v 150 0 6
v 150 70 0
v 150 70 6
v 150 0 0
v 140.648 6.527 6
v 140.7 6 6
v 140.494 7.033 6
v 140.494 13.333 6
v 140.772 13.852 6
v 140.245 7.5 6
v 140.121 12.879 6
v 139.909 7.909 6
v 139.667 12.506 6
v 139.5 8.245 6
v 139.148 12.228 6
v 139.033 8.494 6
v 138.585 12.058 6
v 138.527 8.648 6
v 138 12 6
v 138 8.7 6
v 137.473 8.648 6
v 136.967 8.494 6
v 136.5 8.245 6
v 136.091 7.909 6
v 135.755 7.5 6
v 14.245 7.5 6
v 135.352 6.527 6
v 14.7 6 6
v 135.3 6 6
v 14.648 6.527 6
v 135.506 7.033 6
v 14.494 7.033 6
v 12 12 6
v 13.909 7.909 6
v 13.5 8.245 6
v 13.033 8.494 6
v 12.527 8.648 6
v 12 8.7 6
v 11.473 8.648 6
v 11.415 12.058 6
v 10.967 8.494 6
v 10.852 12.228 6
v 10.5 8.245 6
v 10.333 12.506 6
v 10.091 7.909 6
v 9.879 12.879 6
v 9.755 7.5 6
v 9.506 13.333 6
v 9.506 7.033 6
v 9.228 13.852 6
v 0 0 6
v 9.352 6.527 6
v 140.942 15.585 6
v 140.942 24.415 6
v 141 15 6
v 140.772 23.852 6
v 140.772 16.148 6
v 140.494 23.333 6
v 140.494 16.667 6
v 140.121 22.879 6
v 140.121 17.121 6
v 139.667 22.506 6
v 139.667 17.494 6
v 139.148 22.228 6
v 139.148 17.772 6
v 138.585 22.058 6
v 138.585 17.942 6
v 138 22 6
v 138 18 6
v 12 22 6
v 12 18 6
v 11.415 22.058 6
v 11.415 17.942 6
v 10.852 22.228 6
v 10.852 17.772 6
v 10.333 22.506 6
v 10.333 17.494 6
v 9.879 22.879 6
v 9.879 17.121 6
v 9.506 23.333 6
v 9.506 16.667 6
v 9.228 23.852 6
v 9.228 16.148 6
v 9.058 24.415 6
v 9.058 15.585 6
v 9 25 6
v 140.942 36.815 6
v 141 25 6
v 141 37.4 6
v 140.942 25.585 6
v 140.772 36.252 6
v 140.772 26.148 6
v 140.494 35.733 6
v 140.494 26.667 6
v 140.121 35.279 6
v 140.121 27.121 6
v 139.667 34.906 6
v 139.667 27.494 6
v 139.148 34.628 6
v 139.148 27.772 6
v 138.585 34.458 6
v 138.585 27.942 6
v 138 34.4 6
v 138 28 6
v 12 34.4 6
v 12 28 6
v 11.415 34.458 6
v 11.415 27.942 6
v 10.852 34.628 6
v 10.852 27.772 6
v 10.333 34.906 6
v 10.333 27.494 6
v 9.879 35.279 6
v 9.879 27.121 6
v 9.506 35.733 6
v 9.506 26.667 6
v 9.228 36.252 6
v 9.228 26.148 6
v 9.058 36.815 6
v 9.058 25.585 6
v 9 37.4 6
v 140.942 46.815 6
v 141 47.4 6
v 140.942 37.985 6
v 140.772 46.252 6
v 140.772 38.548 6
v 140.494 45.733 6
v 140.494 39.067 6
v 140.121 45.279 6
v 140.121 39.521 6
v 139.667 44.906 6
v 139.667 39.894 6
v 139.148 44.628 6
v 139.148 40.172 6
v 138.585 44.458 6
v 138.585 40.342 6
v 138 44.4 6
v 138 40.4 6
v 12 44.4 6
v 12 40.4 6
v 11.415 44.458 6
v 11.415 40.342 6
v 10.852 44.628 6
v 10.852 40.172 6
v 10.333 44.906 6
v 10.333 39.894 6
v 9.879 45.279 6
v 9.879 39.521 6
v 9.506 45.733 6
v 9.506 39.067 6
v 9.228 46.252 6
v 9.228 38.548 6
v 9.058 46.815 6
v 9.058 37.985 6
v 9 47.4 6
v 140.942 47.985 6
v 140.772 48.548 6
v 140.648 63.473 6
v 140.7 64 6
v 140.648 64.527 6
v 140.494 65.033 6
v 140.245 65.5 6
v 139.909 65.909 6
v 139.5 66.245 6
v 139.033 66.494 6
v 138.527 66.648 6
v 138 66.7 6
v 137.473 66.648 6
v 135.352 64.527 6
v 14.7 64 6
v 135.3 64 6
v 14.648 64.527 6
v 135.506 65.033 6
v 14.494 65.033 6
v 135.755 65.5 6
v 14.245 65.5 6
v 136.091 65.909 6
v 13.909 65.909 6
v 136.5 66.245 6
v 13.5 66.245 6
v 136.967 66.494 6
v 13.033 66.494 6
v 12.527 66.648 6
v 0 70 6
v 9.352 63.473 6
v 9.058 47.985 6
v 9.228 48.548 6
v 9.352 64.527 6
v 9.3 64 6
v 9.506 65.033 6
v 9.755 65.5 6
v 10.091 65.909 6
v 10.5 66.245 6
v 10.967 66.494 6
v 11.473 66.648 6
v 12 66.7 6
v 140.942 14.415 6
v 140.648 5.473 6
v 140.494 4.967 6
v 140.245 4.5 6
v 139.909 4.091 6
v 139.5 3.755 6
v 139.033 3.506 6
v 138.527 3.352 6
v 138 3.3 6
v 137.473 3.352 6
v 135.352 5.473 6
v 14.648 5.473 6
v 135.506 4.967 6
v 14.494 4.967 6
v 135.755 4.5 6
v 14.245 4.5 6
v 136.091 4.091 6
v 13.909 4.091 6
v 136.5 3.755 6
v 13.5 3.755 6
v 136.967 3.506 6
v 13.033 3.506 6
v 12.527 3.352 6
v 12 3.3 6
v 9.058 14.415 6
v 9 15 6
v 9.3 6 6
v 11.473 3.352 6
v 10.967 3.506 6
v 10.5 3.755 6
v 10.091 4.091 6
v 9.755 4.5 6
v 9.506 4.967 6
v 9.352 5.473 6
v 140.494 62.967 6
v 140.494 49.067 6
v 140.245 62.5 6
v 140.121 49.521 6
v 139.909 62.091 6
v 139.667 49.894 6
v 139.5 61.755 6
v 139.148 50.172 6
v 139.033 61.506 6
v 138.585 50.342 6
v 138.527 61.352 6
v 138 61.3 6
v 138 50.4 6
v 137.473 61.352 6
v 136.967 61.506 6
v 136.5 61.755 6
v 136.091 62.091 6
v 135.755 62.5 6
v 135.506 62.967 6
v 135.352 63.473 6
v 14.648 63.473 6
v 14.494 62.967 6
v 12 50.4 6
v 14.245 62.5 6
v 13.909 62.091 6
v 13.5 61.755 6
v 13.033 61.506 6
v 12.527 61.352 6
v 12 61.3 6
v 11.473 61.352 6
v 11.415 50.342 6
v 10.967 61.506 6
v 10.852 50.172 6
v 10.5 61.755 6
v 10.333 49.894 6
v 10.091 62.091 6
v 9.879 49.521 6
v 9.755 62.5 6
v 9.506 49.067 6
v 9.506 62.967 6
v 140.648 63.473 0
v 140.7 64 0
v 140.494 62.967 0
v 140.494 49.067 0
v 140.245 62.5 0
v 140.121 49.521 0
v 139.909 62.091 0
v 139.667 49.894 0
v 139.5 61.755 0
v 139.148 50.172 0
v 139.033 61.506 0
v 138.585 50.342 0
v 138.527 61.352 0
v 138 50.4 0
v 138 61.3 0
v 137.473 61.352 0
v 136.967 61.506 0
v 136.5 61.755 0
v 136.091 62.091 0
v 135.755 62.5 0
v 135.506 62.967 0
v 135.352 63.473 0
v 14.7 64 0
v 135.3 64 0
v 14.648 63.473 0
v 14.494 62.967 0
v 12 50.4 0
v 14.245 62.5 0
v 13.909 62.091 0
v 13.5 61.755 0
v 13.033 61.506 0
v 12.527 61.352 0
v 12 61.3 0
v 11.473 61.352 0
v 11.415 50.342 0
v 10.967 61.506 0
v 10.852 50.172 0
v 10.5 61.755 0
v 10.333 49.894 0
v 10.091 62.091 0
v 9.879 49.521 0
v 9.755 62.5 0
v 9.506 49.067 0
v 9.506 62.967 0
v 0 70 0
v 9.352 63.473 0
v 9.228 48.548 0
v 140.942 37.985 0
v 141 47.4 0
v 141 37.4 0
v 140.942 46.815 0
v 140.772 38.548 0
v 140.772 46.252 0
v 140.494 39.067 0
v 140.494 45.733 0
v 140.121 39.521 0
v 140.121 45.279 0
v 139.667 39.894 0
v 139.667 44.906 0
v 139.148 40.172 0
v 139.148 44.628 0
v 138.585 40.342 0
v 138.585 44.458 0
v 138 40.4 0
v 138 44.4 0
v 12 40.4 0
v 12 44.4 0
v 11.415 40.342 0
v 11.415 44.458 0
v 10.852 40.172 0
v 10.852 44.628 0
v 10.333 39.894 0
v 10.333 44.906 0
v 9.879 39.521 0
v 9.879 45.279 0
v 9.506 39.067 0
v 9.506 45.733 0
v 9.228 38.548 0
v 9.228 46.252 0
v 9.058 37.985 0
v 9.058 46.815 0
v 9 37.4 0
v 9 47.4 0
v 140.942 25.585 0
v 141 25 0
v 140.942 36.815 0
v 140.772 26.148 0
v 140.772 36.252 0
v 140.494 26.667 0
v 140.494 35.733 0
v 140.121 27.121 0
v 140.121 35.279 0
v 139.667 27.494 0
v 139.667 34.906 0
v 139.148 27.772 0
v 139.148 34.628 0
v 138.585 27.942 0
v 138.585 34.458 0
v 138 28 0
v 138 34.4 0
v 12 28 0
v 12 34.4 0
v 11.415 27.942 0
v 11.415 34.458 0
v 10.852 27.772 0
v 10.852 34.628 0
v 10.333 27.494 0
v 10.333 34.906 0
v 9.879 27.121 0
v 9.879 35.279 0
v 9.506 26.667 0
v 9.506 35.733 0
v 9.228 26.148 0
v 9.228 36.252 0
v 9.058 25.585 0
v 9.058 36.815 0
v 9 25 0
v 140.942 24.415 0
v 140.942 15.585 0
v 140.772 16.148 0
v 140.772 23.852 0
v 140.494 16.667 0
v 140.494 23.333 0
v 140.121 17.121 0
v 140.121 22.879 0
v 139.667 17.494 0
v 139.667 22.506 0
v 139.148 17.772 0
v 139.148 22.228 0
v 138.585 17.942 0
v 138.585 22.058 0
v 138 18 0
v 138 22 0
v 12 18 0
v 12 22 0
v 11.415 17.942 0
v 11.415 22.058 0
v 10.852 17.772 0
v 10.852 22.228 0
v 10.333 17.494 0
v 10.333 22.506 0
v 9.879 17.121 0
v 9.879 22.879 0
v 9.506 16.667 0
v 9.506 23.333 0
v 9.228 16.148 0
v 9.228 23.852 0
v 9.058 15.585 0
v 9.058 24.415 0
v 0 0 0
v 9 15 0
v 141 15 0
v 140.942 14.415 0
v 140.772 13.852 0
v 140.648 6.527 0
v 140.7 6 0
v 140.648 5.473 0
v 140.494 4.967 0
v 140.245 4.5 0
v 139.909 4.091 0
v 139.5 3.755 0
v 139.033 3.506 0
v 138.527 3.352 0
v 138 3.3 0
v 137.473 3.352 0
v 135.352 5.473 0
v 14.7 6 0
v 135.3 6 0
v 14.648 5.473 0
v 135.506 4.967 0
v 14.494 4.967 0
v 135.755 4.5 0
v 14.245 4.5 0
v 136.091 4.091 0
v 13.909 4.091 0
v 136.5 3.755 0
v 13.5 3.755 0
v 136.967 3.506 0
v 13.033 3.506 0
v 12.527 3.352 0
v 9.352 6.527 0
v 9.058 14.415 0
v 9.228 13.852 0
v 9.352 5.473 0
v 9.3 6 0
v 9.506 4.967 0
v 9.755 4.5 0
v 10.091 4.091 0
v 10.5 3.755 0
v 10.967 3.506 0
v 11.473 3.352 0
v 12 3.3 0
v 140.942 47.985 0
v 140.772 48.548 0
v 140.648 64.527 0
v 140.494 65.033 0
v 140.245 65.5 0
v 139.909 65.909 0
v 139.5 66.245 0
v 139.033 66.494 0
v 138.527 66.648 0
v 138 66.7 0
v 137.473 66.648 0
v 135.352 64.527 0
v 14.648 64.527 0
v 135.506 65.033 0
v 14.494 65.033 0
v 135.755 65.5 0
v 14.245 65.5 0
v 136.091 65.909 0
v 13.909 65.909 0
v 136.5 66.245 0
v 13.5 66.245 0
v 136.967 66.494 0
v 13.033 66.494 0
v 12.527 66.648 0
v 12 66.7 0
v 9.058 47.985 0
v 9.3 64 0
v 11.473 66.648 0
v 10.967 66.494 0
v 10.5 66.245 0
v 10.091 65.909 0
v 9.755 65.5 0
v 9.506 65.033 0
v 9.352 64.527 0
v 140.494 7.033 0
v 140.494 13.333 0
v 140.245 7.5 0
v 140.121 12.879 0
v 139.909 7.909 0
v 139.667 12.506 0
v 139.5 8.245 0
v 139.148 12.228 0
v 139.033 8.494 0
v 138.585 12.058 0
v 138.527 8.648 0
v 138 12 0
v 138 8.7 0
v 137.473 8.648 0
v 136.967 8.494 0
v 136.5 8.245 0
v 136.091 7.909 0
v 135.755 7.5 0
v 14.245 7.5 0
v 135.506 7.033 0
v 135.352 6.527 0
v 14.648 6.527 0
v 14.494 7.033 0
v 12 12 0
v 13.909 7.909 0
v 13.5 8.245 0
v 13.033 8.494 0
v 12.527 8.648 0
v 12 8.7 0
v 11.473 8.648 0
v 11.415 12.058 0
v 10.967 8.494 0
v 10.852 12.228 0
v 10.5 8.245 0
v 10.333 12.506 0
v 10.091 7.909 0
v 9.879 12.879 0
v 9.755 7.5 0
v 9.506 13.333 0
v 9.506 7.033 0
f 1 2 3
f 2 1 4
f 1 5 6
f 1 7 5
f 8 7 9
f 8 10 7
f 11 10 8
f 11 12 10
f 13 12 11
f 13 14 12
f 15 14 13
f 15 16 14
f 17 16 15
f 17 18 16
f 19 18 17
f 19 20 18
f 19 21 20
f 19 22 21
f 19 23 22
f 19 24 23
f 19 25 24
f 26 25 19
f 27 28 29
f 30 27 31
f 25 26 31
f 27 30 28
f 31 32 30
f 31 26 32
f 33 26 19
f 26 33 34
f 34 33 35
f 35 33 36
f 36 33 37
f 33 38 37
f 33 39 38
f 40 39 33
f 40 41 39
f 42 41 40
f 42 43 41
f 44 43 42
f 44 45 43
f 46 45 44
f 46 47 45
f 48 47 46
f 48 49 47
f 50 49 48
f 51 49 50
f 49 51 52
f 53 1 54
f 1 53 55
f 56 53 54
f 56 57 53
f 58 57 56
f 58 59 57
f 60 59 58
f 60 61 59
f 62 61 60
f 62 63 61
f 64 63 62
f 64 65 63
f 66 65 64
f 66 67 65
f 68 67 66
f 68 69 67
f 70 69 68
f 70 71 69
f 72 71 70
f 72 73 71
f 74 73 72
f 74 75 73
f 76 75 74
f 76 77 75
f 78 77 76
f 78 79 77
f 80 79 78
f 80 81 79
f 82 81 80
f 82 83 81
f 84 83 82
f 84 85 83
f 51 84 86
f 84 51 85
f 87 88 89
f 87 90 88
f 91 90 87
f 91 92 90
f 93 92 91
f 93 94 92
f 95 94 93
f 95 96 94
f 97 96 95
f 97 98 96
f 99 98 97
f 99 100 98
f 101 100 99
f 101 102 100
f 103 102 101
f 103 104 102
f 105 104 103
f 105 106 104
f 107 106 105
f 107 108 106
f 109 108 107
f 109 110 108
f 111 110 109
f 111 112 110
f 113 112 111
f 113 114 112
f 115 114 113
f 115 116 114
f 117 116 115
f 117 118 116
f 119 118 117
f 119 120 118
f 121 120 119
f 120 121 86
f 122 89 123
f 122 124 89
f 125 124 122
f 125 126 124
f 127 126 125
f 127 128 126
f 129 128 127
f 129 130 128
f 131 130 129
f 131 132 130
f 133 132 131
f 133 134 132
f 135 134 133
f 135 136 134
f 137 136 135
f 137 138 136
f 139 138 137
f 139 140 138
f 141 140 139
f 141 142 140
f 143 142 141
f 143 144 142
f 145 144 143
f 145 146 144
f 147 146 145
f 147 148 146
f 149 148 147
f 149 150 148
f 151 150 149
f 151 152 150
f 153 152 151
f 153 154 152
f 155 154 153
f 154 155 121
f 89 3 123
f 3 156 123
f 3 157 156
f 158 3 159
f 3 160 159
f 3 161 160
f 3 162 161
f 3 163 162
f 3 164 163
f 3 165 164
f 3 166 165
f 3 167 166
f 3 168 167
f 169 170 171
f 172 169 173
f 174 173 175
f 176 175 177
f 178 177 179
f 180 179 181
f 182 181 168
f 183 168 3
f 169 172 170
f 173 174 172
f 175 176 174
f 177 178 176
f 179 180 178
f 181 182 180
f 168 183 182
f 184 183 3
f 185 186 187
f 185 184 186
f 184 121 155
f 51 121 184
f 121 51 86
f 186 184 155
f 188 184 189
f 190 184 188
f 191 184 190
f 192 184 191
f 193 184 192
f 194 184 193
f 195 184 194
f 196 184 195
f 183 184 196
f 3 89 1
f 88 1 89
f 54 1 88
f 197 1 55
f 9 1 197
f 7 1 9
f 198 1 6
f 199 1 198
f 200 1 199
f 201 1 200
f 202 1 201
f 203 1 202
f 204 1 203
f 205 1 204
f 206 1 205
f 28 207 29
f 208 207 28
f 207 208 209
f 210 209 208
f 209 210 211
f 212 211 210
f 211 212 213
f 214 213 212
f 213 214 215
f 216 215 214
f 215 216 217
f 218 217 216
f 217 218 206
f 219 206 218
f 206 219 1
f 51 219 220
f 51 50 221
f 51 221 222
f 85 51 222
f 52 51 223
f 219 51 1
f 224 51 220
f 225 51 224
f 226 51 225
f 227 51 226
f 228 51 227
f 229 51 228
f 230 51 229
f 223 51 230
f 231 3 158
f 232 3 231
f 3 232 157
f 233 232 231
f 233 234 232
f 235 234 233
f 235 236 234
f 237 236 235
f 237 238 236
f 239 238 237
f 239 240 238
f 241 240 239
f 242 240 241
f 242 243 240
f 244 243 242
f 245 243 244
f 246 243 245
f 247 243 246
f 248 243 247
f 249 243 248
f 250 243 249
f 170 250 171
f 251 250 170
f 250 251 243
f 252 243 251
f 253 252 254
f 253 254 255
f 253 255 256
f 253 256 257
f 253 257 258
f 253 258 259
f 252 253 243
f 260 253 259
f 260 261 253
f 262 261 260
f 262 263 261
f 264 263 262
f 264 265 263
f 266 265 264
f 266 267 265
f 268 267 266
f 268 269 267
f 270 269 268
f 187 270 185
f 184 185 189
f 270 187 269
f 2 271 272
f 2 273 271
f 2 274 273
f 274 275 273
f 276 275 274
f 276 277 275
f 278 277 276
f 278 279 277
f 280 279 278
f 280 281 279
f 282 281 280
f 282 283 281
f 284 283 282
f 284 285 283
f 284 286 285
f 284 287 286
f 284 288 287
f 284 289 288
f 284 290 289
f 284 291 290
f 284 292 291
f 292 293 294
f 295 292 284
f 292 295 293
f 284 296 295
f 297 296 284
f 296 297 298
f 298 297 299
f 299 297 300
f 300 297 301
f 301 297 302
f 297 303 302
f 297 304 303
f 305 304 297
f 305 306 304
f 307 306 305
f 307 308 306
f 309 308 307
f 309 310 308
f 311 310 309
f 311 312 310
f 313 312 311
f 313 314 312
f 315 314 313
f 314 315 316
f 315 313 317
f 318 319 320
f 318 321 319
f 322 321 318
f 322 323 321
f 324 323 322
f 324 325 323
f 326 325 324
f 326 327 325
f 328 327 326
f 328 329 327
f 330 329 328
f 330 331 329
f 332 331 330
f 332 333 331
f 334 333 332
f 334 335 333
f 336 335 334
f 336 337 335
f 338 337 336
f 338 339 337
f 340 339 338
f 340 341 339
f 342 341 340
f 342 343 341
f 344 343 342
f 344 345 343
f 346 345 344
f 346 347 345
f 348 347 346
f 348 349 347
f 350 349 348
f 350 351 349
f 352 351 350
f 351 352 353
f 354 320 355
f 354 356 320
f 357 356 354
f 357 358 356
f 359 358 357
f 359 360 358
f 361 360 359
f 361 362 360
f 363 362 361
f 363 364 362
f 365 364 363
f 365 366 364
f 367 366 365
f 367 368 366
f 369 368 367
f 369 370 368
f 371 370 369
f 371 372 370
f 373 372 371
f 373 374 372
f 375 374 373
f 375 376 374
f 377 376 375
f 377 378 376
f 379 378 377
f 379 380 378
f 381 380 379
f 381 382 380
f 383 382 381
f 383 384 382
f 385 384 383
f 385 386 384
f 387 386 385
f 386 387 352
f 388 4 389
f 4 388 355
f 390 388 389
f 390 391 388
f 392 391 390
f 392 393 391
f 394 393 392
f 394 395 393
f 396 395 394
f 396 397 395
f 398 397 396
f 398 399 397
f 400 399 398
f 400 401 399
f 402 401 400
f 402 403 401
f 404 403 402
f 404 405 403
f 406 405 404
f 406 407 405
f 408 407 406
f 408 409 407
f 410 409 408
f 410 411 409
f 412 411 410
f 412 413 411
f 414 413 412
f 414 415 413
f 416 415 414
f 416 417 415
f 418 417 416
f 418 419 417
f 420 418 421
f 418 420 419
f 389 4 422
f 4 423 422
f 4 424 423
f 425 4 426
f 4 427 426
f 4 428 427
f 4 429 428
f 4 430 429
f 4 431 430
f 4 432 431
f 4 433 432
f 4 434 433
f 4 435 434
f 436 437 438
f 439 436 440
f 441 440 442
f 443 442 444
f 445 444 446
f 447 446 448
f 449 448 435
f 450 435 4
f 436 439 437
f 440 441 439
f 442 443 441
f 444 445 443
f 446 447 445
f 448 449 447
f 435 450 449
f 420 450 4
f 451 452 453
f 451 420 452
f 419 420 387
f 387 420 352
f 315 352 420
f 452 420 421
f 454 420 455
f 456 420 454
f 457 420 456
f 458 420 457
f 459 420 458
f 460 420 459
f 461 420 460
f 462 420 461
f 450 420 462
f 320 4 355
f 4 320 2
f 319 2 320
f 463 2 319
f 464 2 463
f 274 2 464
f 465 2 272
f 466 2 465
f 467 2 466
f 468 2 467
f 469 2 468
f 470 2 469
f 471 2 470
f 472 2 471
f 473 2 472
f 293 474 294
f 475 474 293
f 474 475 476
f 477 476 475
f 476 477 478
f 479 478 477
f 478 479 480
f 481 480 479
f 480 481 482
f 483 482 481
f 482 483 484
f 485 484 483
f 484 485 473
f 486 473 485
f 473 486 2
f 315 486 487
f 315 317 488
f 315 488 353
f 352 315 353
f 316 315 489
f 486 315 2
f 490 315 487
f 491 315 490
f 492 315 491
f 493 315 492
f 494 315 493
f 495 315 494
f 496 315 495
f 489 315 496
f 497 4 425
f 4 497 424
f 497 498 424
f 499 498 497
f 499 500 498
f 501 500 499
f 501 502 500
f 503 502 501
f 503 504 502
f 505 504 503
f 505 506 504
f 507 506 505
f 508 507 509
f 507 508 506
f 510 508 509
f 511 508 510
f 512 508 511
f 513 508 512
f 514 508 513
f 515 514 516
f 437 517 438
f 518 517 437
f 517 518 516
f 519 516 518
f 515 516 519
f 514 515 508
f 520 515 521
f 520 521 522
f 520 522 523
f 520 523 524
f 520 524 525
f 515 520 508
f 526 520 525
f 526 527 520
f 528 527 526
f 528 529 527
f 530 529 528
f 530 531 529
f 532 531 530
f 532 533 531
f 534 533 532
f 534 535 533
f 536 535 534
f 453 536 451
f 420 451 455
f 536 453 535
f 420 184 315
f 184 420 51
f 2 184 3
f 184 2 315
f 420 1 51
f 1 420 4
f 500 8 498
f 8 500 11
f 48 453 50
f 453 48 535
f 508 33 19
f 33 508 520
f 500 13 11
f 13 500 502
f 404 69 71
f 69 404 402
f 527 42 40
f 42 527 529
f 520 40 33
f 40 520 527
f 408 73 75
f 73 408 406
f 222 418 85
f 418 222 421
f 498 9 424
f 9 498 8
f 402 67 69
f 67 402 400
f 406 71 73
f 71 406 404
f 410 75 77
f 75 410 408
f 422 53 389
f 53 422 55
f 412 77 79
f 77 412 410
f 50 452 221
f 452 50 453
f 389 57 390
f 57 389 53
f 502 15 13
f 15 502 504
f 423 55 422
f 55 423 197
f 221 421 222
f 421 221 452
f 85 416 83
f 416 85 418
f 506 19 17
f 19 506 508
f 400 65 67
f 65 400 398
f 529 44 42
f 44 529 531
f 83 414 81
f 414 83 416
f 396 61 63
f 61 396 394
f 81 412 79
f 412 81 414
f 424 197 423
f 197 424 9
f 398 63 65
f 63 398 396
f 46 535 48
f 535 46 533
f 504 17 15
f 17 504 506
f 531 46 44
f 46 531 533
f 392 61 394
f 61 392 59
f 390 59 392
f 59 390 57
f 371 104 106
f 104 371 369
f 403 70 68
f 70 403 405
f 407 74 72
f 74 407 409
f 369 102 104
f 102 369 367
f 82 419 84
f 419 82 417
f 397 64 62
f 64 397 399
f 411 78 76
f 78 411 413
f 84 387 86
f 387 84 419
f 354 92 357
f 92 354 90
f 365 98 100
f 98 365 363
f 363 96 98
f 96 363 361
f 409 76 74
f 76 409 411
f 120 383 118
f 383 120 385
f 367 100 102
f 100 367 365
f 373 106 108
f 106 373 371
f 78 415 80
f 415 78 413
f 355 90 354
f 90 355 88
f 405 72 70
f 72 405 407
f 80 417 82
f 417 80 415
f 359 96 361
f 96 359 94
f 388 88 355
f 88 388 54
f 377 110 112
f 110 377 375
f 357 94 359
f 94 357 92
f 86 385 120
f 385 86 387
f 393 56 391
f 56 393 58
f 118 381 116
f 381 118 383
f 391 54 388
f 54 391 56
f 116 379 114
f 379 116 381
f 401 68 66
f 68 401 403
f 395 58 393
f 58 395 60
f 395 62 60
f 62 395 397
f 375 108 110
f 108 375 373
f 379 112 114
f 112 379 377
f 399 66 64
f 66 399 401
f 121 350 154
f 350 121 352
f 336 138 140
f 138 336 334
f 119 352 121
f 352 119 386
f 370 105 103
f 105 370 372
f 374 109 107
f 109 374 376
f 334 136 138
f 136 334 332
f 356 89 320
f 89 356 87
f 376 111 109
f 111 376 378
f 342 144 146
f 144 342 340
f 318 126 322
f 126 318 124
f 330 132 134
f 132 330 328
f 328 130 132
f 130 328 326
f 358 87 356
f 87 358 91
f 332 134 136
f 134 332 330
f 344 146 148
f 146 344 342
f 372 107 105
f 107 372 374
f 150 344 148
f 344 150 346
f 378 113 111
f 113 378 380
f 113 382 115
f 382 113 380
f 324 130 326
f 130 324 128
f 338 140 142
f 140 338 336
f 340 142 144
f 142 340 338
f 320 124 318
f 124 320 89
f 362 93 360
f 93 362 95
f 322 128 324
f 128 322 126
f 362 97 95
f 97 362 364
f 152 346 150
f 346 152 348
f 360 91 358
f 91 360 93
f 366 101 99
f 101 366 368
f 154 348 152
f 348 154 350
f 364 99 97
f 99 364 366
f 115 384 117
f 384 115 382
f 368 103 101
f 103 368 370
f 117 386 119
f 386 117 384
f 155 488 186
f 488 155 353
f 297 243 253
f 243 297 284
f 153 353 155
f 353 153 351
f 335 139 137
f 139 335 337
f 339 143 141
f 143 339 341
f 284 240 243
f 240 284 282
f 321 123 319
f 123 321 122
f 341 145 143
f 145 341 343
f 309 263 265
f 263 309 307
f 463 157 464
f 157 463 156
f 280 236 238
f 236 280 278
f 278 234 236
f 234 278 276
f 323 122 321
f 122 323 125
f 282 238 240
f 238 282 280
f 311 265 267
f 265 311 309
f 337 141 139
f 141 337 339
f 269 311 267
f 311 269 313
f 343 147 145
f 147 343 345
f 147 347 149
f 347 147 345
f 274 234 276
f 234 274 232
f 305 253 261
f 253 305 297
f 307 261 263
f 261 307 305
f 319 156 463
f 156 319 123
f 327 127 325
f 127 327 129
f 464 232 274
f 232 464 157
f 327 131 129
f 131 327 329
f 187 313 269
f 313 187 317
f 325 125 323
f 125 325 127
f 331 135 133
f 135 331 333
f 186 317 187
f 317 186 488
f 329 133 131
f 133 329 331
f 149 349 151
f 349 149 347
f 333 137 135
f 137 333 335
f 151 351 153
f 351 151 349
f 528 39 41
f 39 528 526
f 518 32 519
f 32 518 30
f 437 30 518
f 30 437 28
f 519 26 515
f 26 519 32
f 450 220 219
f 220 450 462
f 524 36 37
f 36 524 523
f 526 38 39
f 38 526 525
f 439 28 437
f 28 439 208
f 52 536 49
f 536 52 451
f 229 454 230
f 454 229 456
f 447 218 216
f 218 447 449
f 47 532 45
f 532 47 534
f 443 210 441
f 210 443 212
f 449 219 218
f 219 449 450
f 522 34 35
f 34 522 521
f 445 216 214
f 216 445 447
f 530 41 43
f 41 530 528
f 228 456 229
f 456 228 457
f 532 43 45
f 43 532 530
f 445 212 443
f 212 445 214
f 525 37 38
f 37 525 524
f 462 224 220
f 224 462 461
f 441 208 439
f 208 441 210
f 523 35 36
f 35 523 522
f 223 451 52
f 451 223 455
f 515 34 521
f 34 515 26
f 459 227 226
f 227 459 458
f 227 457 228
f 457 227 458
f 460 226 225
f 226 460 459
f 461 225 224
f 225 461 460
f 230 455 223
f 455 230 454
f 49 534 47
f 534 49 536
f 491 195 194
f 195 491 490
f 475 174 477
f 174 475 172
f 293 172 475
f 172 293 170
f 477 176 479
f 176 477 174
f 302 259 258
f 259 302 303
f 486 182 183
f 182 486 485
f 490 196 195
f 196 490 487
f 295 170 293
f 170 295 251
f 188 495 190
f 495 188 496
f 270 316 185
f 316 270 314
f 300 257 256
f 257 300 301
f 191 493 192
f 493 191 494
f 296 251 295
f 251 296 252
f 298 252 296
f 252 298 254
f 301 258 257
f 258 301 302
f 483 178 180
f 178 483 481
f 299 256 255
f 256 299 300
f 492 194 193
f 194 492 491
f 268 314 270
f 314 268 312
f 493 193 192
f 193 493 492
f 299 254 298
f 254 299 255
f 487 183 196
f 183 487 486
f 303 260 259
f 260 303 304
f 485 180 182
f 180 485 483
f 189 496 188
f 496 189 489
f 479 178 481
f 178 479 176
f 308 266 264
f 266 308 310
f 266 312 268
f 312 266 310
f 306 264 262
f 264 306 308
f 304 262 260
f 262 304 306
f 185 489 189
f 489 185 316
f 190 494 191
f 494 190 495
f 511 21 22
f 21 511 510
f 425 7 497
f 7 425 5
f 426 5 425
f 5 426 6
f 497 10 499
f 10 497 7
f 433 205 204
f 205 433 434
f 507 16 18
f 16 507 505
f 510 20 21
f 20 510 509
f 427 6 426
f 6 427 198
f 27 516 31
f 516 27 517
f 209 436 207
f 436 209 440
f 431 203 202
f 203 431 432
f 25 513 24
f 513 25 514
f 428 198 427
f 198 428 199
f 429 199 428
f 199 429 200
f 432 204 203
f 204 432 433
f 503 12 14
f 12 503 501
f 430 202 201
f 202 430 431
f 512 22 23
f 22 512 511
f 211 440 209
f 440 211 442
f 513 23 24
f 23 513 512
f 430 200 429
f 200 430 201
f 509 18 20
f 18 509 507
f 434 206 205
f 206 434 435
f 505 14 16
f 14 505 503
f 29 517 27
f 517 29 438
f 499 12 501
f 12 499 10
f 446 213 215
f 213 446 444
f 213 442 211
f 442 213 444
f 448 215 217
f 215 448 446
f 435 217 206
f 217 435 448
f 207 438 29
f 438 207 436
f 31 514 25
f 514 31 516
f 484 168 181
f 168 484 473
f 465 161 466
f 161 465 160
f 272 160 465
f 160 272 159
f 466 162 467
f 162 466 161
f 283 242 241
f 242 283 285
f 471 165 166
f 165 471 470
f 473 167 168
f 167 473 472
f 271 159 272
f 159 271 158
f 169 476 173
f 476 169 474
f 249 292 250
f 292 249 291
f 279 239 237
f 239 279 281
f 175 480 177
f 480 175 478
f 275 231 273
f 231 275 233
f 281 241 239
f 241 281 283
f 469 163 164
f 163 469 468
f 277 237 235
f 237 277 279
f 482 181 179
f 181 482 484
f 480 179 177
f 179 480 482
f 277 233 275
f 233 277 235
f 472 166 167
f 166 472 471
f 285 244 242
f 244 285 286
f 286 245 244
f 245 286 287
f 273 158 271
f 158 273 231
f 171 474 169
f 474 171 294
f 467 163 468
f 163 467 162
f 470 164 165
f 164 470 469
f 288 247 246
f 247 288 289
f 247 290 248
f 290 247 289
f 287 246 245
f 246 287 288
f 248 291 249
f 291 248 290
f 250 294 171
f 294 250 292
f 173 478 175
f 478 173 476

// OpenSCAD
$fn = 32;

// ----------------------------------------------------------------------
// Slotted panel: 150 x 70 mm, 4 ряда of slots
// ----------------------------------------------------------------------

// --- parameters (mm) ---
panel_w = 150;            // panel width
panel_d = 70;             // panel depth
thick = 6;                // panel thickness
slot_w = 6;               // slot width
pitch0 = 10;              // first row pitch
pitch_step = 2.4;         // pitch increase per row
margin = 12;              // margin around the slot field
rows = 4;                 // number of slot rows
mount_d = 5.4;            // mounting holes
mount_x = 63;             // mounting hole offset

difference() {
  union() {
    cube([panel_w, panel_d, thick]);
  }
  /* slot rows: stadium shaped cutters, 2.5 mm clear of both faces */
  /* row 0: pitch 10, length 126 */
  hull() {
    translate([12, 15, -2.5]) cylinder(h = thick + 5, d = slot_w);
    translate([138, 15, -2.5]) cylinder(h = thick + 5, d = slot_w);
  }
  /* row 1: pitch 12.4, length 126 */
  hull() {
    translate([12, 25, -2.5]) cylinder(h = thick + 5, d = slot_w);
    translate([138, 25, -2.5]) cylinder(h = thick + 5, d = slot_w);
  }
  /* row 2: pitch 10, length 126 */
  hull() {
    translate([12, 37.4, -2.5]) cylinder(h = thick + 5, d = slot_w);
    translate([138, 37.4, -2.5]) cylinder(h = thick + 5, d = slot_w);
  }
  /* row 3: pitch 12.4, length 126 */
  hull() {
    translate([12, 47.4, -2.5]) cylinder(h = thick + 5, d = slot_w);
    translate([138, 47.4, -2.5]) cylinder(h = thick + 5, d = slot_w);
  }
  translate([12, 6, -2.5]) cylinder(h = 11, d = mount_d);
  translate([12, 64, -2.5]) cylinder(h = 11, d = mount_d);
  translate([138, 6, -2.5]) cylinder(h = 11, d = mount_d);
  translate([138, 64, -2.5]) cylinder(h = 11, d = mount_d);
}
